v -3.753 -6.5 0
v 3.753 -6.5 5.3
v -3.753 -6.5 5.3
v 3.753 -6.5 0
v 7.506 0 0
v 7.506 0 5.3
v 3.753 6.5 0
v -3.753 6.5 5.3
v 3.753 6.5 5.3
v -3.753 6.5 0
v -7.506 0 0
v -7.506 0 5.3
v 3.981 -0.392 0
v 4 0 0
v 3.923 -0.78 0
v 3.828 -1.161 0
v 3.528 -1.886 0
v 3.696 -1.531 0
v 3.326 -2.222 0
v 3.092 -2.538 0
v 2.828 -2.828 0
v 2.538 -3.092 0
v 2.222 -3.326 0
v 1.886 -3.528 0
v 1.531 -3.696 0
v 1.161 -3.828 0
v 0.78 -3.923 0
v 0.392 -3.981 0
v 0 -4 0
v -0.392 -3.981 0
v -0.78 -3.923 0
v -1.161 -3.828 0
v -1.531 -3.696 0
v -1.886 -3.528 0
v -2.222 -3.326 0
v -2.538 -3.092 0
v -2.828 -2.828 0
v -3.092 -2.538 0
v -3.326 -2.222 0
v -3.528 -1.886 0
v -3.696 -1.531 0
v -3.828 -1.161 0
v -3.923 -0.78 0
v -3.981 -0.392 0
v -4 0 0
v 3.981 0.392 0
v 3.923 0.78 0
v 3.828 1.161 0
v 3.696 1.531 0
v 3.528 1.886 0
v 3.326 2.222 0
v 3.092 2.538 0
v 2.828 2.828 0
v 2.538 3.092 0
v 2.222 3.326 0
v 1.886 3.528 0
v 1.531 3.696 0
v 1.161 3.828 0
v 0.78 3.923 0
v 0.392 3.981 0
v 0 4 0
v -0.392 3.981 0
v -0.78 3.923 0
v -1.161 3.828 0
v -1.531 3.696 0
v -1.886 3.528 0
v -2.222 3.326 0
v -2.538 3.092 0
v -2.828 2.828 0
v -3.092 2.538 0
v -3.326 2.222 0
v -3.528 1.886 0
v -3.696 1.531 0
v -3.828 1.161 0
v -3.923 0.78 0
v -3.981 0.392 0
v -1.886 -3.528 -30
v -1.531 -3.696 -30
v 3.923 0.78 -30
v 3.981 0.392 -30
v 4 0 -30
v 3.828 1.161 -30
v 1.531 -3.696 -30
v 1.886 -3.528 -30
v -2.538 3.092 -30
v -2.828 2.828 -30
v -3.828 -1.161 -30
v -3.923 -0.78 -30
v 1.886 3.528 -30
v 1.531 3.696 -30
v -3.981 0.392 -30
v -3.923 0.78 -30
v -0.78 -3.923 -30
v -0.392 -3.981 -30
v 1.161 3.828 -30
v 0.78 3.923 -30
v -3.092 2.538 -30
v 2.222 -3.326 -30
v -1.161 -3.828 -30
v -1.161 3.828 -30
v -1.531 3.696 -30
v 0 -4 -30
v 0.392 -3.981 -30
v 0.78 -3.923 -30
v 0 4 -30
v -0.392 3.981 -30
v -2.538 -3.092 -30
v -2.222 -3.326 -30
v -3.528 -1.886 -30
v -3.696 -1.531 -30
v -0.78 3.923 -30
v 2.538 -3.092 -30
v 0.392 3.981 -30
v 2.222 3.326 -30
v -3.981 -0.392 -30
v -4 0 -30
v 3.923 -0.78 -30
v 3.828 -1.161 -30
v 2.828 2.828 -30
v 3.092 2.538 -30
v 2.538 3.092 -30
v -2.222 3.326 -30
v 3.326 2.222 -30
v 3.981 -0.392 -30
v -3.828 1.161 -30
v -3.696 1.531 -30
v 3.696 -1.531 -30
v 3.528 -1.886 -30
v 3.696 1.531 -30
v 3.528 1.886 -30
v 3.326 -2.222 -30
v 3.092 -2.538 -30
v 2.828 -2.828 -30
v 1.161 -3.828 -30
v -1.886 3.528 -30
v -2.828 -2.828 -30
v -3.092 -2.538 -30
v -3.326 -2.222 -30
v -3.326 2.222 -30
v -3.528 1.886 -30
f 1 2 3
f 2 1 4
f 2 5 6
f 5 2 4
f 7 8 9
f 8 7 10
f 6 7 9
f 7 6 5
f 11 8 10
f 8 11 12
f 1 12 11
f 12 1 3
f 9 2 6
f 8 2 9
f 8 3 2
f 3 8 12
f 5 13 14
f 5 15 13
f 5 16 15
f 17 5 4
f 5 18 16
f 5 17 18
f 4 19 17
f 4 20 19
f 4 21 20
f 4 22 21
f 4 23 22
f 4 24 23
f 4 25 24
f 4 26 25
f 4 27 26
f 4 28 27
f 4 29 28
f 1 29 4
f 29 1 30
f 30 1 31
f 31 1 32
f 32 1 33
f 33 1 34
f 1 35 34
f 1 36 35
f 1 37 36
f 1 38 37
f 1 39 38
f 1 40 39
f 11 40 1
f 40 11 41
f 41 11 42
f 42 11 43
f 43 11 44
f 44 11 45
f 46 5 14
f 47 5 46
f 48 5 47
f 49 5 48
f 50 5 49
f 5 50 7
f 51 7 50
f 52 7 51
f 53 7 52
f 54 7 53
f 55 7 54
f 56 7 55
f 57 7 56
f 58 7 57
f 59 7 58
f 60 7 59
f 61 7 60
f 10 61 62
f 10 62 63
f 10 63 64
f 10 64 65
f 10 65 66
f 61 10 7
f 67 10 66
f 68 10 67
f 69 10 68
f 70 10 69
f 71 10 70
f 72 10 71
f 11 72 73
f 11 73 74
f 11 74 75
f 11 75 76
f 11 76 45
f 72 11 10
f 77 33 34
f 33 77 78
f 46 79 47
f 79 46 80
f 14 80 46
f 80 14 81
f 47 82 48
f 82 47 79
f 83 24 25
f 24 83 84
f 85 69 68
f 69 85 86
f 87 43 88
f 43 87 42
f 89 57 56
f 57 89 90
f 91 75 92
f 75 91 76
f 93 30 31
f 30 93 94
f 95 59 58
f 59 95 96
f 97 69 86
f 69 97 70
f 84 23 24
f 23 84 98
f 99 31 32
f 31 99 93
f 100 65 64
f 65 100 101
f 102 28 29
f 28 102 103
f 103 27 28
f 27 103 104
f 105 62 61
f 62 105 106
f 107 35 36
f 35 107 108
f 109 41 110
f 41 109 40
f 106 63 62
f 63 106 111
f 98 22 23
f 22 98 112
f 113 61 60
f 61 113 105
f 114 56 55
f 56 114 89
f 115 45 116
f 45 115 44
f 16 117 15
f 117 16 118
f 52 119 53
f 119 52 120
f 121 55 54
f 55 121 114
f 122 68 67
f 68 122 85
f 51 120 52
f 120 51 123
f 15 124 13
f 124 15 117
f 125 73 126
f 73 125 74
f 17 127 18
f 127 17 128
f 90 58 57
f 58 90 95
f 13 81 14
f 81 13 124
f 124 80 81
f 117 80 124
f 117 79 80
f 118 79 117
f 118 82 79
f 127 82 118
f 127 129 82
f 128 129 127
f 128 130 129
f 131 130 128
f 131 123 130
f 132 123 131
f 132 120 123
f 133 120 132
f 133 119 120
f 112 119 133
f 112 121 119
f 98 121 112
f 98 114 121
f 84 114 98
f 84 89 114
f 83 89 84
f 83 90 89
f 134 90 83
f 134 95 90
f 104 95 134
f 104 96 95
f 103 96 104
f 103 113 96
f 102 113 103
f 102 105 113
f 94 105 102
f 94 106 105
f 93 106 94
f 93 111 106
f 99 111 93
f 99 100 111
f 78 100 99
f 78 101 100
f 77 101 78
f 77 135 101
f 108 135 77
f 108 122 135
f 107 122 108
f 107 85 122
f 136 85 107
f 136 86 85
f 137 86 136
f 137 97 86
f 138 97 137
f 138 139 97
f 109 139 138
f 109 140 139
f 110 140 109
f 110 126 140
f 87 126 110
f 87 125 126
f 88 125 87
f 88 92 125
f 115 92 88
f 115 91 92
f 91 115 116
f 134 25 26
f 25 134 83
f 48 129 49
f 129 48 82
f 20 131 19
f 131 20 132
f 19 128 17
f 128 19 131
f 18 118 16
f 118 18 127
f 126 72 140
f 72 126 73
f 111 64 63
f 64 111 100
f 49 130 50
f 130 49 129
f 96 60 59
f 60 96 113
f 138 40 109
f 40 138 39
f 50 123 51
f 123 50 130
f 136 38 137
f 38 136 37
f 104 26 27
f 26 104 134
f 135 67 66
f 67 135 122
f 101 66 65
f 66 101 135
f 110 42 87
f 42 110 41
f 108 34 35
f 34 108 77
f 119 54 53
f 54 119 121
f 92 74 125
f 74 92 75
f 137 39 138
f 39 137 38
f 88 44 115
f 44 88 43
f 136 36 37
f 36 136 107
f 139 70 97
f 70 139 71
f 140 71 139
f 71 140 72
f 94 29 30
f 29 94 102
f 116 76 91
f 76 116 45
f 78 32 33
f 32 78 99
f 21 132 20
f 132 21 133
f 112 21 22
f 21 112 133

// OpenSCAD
$fn = 64;

// Head: hexagonal prism, bottom at z=0, top at z=5.3
// across-flats = 13mm, so circumradius = 13 / (2 * cos(30))
head_af = 13;
head_height = 5.3;
head_r = head_af / (2 * cos(30));

// Shank: cylinder diameter 8mm, length 30mm, extending from z=0 downward
shank_d = 8;
shank_length = 30;

// Head
translate([0, 0, head_height / 2])
    cylinder(h = head_height, r = head_r, $fn = 6, center = true);

// Shank
translate([0, 0, -shank_length / 2])
    cylinder(h = shank_length, d = shank_d, center = true);
